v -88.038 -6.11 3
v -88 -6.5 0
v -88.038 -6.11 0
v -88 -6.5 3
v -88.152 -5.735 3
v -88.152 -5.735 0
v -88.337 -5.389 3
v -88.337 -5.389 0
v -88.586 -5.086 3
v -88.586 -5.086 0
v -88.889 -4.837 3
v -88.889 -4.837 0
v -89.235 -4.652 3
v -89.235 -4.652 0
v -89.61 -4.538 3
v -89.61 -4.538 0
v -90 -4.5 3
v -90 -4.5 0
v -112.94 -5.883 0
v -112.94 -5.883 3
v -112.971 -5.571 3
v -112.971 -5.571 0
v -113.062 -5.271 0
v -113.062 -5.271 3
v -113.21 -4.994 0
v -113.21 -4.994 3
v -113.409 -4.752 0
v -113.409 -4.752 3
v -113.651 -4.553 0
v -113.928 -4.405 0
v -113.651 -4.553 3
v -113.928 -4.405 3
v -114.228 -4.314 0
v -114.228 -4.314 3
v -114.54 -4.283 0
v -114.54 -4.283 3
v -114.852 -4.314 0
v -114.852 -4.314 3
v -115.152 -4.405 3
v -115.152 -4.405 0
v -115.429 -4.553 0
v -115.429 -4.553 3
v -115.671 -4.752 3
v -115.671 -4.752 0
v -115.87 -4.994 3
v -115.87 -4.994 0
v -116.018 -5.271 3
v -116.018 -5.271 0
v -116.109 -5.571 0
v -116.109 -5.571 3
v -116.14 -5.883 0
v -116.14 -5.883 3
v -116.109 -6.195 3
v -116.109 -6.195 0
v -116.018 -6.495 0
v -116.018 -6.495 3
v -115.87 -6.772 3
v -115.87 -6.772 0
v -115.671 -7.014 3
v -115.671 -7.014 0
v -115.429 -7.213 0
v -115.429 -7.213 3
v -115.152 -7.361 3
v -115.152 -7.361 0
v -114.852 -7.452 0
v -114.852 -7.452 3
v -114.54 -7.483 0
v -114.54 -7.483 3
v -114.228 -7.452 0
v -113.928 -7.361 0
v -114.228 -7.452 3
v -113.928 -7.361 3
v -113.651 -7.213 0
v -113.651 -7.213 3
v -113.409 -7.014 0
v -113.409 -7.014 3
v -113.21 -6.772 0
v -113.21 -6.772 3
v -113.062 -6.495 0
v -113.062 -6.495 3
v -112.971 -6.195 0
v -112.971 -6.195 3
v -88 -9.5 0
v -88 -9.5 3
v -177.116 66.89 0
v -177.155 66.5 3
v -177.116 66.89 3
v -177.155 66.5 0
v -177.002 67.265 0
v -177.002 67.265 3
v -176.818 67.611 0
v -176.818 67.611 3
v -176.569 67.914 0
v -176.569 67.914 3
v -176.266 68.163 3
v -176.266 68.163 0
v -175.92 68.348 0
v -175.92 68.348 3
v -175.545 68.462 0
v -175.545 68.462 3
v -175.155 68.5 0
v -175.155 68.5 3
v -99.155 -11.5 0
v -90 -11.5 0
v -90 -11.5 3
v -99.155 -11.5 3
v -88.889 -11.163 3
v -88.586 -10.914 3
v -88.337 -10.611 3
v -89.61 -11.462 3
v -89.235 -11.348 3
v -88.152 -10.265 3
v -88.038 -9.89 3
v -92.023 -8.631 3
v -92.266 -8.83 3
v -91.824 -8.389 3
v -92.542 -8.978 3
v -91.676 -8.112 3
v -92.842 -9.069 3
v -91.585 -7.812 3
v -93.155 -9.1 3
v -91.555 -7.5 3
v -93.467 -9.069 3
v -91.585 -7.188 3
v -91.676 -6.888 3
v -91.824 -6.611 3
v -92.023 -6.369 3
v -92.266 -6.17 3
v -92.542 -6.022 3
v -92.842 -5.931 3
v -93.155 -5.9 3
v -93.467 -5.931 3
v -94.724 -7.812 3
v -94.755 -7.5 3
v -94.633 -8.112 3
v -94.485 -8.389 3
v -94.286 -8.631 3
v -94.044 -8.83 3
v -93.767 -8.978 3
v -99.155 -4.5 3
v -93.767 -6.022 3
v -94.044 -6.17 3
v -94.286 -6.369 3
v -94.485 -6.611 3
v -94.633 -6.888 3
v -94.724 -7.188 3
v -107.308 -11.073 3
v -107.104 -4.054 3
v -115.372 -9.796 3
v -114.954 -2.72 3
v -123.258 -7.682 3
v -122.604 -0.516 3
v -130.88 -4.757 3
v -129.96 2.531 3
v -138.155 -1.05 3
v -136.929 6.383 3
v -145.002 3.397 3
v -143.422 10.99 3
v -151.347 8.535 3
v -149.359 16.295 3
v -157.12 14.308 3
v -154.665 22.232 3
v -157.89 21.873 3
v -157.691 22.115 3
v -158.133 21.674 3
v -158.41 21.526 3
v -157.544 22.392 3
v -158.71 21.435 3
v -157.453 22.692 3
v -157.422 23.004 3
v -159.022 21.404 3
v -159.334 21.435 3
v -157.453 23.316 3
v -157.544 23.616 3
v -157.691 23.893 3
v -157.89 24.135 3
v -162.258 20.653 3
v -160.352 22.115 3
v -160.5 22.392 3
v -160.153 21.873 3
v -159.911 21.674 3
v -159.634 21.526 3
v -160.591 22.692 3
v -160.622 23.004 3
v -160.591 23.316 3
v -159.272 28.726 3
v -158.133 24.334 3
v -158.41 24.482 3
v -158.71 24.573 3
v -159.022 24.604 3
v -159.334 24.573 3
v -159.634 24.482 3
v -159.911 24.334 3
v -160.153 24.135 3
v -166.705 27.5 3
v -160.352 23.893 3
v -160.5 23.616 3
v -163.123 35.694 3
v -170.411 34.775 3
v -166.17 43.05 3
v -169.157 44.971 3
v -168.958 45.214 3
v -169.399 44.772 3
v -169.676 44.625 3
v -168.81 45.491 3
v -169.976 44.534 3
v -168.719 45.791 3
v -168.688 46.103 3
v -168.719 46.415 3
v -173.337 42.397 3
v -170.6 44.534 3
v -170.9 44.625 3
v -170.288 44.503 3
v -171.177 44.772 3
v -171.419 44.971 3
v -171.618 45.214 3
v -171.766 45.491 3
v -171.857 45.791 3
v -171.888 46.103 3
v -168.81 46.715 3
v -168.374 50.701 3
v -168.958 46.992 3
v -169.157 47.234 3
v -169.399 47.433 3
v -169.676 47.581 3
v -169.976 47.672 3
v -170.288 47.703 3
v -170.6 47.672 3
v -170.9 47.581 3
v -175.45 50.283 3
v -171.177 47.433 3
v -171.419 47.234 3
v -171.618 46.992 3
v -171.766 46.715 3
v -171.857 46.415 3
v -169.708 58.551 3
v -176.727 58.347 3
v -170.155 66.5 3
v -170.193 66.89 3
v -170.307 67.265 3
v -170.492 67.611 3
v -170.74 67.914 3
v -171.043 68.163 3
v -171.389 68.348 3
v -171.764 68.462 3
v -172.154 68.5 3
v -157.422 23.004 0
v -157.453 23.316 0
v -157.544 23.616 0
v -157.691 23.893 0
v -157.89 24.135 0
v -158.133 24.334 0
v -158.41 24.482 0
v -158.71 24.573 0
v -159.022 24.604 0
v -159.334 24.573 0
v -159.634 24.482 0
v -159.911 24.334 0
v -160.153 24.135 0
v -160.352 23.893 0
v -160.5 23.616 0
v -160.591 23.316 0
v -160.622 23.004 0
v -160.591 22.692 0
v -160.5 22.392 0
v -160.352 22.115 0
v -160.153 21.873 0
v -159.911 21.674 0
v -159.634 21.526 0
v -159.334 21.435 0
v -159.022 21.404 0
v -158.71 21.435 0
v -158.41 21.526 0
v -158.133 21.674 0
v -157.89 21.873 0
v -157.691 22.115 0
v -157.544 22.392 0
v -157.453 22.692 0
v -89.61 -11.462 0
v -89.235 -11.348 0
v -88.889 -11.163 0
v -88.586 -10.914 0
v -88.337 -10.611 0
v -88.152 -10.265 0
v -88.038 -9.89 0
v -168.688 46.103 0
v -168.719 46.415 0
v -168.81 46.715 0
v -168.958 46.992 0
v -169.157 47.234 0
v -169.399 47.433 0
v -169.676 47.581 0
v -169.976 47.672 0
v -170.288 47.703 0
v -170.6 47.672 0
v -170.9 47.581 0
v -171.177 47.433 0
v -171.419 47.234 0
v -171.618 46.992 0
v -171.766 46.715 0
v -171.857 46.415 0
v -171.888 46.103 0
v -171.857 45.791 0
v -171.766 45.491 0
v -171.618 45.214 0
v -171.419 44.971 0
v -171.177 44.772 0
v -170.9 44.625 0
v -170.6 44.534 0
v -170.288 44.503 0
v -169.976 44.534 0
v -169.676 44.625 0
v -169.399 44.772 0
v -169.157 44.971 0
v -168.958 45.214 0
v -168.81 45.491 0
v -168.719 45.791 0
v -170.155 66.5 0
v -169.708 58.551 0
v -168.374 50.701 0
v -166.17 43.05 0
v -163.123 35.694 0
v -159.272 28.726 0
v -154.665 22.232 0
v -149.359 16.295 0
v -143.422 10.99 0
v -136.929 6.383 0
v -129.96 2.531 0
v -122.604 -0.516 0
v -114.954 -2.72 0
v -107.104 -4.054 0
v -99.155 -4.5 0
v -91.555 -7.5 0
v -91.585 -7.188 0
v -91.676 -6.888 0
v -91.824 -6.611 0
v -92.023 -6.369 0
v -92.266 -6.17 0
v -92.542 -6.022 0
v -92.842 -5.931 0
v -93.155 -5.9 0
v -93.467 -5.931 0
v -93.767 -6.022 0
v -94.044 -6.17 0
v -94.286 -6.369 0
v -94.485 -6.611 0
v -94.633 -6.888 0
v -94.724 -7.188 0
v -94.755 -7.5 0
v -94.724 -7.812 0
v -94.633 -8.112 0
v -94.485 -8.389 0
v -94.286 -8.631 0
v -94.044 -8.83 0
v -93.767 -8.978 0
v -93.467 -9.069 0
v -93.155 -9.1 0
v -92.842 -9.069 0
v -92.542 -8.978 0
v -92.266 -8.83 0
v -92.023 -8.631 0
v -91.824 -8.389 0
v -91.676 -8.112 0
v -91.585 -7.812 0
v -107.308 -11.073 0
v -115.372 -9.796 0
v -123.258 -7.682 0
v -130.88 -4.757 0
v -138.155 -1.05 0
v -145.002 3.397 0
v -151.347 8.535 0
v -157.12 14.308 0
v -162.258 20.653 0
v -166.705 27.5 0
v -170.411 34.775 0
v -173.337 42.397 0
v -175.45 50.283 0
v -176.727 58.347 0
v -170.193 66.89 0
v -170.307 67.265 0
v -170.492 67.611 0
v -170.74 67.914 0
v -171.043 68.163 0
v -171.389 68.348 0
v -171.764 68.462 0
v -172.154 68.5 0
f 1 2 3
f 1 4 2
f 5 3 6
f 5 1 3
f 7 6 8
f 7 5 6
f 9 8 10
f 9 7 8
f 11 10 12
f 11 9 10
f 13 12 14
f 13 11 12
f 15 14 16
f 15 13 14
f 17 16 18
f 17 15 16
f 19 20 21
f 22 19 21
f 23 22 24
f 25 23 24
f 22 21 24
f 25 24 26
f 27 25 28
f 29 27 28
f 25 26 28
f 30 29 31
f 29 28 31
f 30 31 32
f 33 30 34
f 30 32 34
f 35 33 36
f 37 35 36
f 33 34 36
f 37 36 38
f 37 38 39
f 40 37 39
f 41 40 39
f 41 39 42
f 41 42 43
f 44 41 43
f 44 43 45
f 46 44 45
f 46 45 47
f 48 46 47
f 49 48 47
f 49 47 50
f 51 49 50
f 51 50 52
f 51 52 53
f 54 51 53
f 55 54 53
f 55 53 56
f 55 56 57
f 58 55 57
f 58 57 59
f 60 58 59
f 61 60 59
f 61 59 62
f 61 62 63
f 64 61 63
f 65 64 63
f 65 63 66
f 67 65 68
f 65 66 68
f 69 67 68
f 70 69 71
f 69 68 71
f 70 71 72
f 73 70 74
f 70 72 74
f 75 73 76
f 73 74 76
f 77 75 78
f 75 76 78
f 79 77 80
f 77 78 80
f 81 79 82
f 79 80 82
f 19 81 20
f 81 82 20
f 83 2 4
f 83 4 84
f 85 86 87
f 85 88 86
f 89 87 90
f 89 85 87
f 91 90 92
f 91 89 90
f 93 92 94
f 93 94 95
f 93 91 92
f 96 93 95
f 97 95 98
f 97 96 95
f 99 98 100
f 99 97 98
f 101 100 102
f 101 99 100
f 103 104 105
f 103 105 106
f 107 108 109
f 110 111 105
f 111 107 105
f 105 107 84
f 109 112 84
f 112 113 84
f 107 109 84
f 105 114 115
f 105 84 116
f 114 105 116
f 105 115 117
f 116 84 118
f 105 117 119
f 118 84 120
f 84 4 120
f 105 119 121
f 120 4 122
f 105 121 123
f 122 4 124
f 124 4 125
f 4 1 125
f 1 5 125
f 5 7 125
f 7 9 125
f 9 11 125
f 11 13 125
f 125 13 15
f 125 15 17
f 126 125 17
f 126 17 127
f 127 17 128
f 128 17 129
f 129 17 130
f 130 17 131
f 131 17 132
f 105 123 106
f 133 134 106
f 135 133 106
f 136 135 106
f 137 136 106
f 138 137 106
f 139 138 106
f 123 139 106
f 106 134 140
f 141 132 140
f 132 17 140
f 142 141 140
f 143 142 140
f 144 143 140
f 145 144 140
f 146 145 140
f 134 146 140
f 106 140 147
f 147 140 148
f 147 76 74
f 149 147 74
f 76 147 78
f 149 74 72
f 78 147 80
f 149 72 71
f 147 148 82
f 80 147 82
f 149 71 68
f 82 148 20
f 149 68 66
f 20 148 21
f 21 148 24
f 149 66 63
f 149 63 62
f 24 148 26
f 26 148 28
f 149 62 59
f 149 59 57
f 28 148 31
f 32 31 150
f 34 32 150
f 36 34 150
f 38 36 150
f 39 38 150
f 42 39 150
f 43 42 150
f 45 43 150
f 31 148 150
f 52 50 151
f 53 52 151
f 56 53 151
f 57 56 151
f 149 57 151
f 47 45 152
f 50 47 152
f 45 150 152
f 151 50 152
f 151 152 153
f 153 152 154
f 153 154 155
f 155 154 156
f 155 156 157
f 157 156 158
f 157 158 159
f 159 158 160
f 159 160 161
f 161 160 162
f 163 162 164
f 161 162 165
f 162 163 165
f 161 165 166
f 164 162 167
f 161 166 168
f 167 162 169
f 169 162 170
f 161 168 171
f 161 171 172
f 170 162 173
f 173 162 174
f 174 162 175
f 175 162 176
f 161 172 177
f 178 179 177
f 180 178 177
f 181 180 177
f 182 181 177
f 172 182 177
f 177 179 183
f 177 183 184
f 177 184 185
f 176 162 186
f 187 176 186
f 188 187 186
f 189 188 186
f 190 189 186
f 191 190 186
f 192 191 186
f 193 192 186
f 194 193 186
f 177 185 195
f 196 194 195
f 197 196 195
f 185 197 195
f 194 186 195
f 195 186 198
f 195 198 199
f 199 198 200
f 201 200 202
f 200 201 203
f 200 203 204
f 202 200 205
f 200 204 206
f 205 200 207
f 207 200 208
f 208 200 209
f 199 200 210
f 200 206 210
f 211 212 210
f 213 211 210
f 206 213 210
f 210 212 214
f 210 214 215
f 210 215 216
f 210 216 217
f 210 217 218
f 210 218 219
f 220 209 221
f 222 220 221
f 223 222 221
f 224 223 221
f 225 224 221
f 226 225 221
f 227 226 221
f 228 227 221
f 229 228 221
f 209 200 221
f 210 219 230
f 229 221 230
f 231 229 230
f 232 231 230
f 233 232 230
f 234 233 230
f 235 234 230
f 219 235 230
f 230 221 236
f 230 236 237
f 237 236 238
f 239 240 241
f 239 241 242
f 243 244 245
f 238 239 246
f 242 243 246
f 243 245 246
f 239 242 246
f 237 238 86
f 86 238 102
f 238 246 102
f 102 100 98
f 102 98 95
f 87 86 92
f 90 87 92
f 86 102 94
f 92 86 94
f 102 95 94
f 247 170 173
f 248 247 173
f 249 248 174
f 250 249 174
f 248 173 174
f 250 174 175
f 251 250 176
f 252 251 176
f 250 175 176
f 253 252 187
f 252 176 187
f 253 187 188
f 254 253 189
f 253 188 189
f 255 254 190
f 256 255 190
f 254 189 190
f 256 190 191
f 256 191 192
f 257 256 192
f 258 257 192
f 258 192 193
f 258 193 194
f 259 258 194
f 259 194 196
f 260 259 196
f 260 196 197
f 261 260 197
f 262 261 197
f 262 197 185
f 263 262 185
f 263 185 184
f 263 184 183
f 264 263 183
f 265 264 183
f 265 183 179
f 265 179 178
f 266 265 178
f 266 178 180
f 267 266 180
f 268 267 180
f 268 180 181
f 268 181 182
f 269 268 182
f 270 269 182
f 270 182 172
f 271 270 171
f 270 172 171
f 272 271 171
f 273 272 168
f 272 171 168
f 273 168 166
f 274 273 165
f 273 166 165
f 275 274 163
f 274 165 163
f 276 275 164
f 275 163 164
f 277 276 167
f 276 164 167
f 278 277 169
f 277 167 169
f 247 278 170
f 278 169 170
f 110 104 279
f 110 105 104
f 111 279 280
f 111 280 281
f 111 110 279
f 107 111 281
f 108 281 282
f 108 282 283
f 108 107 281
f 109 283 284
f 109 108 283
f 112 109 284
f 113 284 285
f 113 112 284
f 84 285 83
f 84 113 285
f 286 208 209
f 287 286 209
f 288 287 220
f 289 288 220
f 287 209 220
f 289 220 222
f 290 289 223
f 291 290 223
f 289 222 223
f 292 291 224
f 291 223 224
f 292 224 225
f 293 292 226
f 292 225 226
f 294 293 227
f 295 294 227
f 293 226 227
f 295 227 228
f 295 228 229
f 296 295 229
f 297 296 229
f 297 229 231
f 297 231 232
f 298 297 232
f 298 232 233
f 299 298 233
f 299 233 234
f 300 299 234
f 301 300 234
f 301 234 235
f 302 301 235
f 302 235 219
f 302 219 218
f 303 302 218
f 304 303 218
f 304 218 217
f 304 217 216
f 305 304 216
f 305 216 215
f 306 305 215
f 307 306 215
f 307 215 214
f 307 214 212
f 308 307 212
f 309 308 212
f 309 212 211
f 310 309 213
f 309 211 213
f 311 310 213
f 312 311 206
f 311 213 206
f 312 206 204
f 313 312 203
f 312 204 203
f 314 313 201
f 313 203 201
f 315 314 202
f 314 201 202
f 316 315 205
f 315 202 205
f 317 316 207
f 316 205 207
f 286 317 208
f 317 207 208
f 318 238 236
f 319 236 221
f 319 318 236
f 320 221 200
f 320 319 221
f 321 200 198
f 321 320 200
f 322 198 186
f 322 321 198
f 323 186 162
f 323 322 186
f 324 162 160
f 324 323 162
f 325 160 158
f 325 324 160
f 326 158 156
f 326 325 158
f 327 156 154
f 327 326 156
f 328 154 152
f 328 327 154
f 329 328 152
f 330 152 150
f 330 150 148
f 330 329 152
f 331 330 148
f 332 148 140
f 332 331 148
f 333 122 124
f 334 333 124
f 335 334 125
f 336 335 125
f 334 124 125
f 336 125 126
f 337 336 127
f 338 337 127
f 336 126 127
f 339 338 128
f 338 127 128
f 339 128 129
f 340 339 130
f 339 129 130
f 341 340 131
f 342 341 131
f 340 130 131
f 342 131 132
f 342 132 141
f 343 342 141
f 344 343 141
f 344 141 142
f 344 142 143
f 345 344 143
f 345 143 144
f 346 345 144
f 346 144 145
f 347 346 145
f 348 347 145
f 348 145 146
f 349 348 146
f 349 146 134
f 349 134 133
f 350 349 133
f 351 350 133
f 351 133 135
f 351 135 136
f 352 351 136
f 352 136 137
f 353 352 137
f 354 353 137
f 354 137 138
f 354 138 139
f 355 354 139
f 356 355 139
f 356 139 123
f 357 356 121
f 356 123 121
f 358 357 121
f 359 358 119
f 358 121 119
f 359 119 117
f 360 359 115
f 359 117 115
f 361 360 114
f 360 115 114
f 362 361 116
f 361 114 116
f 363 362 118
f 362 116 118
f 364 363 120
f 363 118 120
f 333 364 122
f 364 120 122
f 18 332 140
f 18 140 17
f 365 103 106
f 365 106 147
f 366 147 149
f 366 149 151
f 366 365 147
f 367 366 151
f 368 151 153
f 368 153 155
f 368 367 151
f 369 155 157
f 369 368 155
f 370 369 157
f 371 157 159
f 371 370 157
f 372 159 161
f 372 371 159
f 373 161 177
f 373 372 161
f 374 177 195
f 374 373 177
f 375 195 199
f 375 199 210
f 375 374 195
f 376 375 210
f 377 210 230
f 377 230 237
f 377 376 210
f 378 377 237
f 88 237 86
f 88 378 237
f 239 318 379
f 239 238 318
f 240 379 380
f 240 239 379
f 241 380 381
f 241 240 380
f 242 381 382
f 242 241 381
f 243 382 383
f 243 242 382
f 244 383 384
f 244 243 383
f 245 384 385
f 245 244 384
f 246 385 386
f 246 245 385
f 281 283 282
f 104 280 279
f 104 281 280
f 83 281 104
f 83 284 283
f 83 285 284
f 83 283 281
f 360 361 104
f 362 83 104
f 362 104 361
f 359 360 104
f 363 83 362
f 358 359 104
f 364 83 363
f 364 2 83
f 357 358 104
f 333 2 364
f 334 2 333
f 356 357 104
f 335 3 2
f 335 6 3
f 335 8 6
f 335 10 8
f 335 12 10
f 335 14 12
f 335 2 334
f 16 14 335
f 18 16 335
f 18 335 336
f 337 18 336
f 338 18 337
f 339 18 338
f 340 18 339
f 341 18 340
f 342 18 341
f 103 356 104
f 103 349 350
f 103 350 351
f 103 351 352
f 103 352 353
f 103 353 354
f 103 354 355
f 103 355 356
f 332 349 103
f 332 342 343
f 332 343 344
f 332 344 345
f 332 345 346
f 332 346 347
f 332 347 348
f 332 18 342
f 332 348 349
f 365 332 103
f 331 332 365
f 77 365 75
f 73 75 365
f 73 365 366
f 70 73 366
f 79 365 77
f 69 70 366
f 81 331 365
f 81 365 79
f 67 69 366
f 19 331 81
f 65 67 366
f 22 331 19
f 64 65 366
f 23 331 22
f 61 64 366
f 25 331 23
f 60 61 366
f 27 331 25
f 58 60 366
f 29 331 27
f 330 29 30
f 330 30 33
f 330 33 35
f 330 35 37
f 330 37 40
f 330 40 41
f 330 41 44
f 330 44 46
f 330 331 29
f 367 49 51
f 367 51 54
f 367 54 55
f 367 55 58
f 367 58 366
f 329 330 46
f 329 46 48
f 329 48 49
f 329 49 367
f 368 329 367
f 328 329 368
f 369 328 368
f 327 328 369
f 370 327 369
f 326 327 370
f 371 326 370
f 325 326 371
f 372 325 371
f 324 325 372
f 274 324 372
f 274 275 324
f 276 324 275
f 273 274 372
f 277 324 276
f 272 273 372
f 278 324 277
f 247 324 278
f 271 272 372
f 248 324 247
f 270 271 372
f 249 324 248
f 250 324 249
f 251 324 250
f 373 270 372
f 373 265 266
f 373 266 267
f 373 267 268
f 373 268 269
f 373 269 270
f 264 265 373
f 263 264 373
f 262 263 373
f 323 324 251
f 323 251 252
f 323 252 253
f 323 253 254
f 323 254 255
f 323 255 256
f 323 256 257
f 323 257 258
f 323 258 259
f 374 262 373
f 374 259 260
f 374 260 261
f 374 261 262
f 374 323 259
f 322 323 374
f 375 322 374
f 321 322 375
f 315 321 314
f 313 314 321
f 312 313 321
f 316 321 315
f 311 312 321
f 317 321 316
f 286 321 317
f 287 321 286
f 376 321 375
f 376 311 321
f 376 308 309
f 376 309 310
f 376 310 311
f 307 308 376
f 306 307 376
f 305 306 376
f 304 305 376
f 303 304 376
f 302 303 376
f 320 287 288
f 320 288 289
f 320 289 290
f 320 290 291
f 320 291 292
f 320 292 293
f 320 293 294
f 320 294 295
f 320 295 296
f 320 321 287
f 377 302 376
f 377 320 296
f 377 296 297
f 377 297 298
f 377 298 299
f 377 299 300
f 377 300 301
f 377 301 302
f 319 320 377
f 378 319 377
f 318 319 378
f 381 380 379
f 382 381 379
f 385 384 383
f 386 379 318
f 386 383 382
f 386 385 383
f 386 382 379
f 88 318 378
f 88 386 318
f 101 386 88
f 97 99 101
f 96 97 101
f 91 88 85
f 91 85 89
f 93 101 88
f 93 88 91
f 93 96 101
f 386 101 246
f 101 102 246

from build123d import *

# Parameters (mm, degrees)
SKETCH_2_R          = 1.6
EXTRUDE_1_DEPTH     = 3
SKETCH_4_W          = 6.5
SKETCH_4_H          = 8
CUT_EXTRUDE_1_DEPTH = 3
SKETCH_6_R          = 1.6
CUT_EXTRUDE_2_DEPTH = 10
CUT_EXTRUDE_START   = -10
CUT_EXTRUDE_3_DEPTH = 10
FILLET_1_R          = 2


with BuildPart() as part:
    # 草图2 → 凸台-拉伸1 (new body)
    with BuildSketch(Plane.XY):
        with BuildLine():
            Line((-162.154590294, 76.5), (-162.154590294, 66.5))
            ThreePointArc((-162.154590294, 66.5), (-143.702317509, 21.952272785), (-99.154590294, 3.5))
            Line((-99.154590294, 3.5), (-88, 3.5))
            Line((-88, 3.5), (-88, -11.5))
            Line((-88, -11.5), (-99.154590294, -11.5))
            ThreePointArc((-99.154590294, -11.5), (-154.308919227, 11.345671067), (-177.154590294, 66.5))
            Line((-177.154590294, 66.5), (-177.154590294, 76.5))
            Line((-177.154590294, 76.5), (-162.154590294, 76.5))
        make_face()
        with Locations((-91.754590294, 1)):
            Circle(SKETCH_2_R, mode=Mode.SUBTRACT)
        with Locations((-99.154590294, 1)):
            Circle(SKETCH_2_R, mode=Mode.SUBTRACT)
        with Locations((-106.910050218, 1.460759219)):
            Circle(SKETCH_2_R, mode=Mode.SUBTRACT)
        with Locations((-114.556398703, 2.836554462)):
            Circle(SKETCH_2_R, mode=Mode.SUBTRACT)
        with Locations((-121.986059394, 5.108029688)):
            Circle(SKETCH_2_R, mode=Mode.SUBTRACT)
        with Locations((-129.094504517, 8.243227549)):
            Circle(SKETCH_2_R, mode=Mode.SUBTRACT)
        with Locations((-135.781725472, 12.198038998)):
            Circle(SKETCH_2_R, mode=Mode.SUBTRACT)
        with Locations((-141.953639856, 16.916823855)):
            Circle(SKETCH_2_R, mode=Mode.SUBTRACT)
        with Locations((-147.523415105, 22.333193613)):
            Circle(SKETCH_2_R, mode=Mode.SUBTRACT)
        with Locations((-152.412690143, 28.370945455)):
            Circle(SKETCH_2_R, mode=Mode.SUBTRACT)
        with Locations((-156.552677837, 34.945134346)):
            Circle(SKETCH_2_R, mode=Mode.SUBTRACT)
        with Locations((-159.885132769, 41.963268131)):
            Circle(SKETCH_2_R, mode=Mode.SUBTRACT)
        with Locations((-162.363170682, 49.326608799)):
            Circle(SKETCH_2_R, mode=Mode.SUBTRACT)
        with Locations((-163.951928103, 56.931561629)):
            Circle(SKETCH_2_R, mode=Mode.SUBTRACT)
        with Locations((-164.62905283, 64.671132664)):
            Circle(SKETCH_2_R, mode=Mode.SUBTRACT)
        with Locations((-164.654590294, 72.371090315)):
            Circle(SKETCH_2_R, mode=Mode.SUBTRACT)
    extrude(amount=EXTRUDE_1_DEPTH)

    # 草图4 → 切除-拉伸1 (cut)
    with BuildSketch(Plane.XY.offset(3)):
        with Locations((-173.904590294, 72.5)):
            Rectangle(SKETCH_4_W, SKETCH_4_H)
    extrude(amount=-CUT_EXTRUDE_1_DEPTH, mode=Mode.SUBTRACT)

    # 草图6 → 切除-拉伸2 (cut)
    with BuildSketch(Plane.XY.offset(3)):
        with Locations((-170.287955794, 46.10283567)):
            Circle(SKETCH_6_R)
        with Locations((-159.021847878, 23.00389133)):
            Circle(SKETCH_6_R)
        with Locations((-114.540055415, -5.882922454)):
            Circle(SKETCH_6_R)
        with Locations((-93.154590294, -7.5)):
            Circle(SKETCH_6_R)
    extrude(amount=-CUT_EXTRUDE_2_DEPTH, mode=Mode.SUBTRACT)

    # 草图8 → 切除-拉伸3 (cut)
    with BuildSketch(Plane.XY.offset(3).offset(CUT_EXTRUDE_START)):
        with BuildLine():
            Line((-88, 3.5), (-99.154590294, 3.5))
            ThreePointArc((-99.154590294, 3.5), (-143.702317509, 21.952272785), (-162.154590294, 66.5))
            Line((-162.154590294, 66.5), (-162.154590294, 76.5))
            Line((-162.154590294, 76.5), (-170.654590294, 76.5))
            Line((-170.654590294, 76.5), (-170.654590294, 68.5))
            Line((-170.654590294, 68.5), (-170.154590294, 68.5))
            Line((-170.154590294, 68.5), (-170.154590294, 66.5))
            ThreePointArc((-170.154590294, 66.5), (-149.359171759, 16.295418536), (-99.154590294, -4.5))
            Line((-99.154590294, -4.5), (-88, -4.5))
            Line((-88, -4.5), (-88, 3.5))
        make_face()
    extrude(amount=CUT_EXTRUDE_3_DEPTH, mode=Mode.SUBTRACT)

    # 圆角1
    fillet_1_edges = [part.edges().sort_by_distance(p)[0] for p in [
        (-177.154590294, 68.5, 1.5),
        (-88, -11.5, 1.5),
        (-88, -4.5, 1.5),
        (-170.154590294, 68.5, 1.5),
    ]]
    fillet(fillet_1_edges, radius=FILLET_1_R - 0.0001)  # a hair under: the kernel refuses the full size


solid = part.part
